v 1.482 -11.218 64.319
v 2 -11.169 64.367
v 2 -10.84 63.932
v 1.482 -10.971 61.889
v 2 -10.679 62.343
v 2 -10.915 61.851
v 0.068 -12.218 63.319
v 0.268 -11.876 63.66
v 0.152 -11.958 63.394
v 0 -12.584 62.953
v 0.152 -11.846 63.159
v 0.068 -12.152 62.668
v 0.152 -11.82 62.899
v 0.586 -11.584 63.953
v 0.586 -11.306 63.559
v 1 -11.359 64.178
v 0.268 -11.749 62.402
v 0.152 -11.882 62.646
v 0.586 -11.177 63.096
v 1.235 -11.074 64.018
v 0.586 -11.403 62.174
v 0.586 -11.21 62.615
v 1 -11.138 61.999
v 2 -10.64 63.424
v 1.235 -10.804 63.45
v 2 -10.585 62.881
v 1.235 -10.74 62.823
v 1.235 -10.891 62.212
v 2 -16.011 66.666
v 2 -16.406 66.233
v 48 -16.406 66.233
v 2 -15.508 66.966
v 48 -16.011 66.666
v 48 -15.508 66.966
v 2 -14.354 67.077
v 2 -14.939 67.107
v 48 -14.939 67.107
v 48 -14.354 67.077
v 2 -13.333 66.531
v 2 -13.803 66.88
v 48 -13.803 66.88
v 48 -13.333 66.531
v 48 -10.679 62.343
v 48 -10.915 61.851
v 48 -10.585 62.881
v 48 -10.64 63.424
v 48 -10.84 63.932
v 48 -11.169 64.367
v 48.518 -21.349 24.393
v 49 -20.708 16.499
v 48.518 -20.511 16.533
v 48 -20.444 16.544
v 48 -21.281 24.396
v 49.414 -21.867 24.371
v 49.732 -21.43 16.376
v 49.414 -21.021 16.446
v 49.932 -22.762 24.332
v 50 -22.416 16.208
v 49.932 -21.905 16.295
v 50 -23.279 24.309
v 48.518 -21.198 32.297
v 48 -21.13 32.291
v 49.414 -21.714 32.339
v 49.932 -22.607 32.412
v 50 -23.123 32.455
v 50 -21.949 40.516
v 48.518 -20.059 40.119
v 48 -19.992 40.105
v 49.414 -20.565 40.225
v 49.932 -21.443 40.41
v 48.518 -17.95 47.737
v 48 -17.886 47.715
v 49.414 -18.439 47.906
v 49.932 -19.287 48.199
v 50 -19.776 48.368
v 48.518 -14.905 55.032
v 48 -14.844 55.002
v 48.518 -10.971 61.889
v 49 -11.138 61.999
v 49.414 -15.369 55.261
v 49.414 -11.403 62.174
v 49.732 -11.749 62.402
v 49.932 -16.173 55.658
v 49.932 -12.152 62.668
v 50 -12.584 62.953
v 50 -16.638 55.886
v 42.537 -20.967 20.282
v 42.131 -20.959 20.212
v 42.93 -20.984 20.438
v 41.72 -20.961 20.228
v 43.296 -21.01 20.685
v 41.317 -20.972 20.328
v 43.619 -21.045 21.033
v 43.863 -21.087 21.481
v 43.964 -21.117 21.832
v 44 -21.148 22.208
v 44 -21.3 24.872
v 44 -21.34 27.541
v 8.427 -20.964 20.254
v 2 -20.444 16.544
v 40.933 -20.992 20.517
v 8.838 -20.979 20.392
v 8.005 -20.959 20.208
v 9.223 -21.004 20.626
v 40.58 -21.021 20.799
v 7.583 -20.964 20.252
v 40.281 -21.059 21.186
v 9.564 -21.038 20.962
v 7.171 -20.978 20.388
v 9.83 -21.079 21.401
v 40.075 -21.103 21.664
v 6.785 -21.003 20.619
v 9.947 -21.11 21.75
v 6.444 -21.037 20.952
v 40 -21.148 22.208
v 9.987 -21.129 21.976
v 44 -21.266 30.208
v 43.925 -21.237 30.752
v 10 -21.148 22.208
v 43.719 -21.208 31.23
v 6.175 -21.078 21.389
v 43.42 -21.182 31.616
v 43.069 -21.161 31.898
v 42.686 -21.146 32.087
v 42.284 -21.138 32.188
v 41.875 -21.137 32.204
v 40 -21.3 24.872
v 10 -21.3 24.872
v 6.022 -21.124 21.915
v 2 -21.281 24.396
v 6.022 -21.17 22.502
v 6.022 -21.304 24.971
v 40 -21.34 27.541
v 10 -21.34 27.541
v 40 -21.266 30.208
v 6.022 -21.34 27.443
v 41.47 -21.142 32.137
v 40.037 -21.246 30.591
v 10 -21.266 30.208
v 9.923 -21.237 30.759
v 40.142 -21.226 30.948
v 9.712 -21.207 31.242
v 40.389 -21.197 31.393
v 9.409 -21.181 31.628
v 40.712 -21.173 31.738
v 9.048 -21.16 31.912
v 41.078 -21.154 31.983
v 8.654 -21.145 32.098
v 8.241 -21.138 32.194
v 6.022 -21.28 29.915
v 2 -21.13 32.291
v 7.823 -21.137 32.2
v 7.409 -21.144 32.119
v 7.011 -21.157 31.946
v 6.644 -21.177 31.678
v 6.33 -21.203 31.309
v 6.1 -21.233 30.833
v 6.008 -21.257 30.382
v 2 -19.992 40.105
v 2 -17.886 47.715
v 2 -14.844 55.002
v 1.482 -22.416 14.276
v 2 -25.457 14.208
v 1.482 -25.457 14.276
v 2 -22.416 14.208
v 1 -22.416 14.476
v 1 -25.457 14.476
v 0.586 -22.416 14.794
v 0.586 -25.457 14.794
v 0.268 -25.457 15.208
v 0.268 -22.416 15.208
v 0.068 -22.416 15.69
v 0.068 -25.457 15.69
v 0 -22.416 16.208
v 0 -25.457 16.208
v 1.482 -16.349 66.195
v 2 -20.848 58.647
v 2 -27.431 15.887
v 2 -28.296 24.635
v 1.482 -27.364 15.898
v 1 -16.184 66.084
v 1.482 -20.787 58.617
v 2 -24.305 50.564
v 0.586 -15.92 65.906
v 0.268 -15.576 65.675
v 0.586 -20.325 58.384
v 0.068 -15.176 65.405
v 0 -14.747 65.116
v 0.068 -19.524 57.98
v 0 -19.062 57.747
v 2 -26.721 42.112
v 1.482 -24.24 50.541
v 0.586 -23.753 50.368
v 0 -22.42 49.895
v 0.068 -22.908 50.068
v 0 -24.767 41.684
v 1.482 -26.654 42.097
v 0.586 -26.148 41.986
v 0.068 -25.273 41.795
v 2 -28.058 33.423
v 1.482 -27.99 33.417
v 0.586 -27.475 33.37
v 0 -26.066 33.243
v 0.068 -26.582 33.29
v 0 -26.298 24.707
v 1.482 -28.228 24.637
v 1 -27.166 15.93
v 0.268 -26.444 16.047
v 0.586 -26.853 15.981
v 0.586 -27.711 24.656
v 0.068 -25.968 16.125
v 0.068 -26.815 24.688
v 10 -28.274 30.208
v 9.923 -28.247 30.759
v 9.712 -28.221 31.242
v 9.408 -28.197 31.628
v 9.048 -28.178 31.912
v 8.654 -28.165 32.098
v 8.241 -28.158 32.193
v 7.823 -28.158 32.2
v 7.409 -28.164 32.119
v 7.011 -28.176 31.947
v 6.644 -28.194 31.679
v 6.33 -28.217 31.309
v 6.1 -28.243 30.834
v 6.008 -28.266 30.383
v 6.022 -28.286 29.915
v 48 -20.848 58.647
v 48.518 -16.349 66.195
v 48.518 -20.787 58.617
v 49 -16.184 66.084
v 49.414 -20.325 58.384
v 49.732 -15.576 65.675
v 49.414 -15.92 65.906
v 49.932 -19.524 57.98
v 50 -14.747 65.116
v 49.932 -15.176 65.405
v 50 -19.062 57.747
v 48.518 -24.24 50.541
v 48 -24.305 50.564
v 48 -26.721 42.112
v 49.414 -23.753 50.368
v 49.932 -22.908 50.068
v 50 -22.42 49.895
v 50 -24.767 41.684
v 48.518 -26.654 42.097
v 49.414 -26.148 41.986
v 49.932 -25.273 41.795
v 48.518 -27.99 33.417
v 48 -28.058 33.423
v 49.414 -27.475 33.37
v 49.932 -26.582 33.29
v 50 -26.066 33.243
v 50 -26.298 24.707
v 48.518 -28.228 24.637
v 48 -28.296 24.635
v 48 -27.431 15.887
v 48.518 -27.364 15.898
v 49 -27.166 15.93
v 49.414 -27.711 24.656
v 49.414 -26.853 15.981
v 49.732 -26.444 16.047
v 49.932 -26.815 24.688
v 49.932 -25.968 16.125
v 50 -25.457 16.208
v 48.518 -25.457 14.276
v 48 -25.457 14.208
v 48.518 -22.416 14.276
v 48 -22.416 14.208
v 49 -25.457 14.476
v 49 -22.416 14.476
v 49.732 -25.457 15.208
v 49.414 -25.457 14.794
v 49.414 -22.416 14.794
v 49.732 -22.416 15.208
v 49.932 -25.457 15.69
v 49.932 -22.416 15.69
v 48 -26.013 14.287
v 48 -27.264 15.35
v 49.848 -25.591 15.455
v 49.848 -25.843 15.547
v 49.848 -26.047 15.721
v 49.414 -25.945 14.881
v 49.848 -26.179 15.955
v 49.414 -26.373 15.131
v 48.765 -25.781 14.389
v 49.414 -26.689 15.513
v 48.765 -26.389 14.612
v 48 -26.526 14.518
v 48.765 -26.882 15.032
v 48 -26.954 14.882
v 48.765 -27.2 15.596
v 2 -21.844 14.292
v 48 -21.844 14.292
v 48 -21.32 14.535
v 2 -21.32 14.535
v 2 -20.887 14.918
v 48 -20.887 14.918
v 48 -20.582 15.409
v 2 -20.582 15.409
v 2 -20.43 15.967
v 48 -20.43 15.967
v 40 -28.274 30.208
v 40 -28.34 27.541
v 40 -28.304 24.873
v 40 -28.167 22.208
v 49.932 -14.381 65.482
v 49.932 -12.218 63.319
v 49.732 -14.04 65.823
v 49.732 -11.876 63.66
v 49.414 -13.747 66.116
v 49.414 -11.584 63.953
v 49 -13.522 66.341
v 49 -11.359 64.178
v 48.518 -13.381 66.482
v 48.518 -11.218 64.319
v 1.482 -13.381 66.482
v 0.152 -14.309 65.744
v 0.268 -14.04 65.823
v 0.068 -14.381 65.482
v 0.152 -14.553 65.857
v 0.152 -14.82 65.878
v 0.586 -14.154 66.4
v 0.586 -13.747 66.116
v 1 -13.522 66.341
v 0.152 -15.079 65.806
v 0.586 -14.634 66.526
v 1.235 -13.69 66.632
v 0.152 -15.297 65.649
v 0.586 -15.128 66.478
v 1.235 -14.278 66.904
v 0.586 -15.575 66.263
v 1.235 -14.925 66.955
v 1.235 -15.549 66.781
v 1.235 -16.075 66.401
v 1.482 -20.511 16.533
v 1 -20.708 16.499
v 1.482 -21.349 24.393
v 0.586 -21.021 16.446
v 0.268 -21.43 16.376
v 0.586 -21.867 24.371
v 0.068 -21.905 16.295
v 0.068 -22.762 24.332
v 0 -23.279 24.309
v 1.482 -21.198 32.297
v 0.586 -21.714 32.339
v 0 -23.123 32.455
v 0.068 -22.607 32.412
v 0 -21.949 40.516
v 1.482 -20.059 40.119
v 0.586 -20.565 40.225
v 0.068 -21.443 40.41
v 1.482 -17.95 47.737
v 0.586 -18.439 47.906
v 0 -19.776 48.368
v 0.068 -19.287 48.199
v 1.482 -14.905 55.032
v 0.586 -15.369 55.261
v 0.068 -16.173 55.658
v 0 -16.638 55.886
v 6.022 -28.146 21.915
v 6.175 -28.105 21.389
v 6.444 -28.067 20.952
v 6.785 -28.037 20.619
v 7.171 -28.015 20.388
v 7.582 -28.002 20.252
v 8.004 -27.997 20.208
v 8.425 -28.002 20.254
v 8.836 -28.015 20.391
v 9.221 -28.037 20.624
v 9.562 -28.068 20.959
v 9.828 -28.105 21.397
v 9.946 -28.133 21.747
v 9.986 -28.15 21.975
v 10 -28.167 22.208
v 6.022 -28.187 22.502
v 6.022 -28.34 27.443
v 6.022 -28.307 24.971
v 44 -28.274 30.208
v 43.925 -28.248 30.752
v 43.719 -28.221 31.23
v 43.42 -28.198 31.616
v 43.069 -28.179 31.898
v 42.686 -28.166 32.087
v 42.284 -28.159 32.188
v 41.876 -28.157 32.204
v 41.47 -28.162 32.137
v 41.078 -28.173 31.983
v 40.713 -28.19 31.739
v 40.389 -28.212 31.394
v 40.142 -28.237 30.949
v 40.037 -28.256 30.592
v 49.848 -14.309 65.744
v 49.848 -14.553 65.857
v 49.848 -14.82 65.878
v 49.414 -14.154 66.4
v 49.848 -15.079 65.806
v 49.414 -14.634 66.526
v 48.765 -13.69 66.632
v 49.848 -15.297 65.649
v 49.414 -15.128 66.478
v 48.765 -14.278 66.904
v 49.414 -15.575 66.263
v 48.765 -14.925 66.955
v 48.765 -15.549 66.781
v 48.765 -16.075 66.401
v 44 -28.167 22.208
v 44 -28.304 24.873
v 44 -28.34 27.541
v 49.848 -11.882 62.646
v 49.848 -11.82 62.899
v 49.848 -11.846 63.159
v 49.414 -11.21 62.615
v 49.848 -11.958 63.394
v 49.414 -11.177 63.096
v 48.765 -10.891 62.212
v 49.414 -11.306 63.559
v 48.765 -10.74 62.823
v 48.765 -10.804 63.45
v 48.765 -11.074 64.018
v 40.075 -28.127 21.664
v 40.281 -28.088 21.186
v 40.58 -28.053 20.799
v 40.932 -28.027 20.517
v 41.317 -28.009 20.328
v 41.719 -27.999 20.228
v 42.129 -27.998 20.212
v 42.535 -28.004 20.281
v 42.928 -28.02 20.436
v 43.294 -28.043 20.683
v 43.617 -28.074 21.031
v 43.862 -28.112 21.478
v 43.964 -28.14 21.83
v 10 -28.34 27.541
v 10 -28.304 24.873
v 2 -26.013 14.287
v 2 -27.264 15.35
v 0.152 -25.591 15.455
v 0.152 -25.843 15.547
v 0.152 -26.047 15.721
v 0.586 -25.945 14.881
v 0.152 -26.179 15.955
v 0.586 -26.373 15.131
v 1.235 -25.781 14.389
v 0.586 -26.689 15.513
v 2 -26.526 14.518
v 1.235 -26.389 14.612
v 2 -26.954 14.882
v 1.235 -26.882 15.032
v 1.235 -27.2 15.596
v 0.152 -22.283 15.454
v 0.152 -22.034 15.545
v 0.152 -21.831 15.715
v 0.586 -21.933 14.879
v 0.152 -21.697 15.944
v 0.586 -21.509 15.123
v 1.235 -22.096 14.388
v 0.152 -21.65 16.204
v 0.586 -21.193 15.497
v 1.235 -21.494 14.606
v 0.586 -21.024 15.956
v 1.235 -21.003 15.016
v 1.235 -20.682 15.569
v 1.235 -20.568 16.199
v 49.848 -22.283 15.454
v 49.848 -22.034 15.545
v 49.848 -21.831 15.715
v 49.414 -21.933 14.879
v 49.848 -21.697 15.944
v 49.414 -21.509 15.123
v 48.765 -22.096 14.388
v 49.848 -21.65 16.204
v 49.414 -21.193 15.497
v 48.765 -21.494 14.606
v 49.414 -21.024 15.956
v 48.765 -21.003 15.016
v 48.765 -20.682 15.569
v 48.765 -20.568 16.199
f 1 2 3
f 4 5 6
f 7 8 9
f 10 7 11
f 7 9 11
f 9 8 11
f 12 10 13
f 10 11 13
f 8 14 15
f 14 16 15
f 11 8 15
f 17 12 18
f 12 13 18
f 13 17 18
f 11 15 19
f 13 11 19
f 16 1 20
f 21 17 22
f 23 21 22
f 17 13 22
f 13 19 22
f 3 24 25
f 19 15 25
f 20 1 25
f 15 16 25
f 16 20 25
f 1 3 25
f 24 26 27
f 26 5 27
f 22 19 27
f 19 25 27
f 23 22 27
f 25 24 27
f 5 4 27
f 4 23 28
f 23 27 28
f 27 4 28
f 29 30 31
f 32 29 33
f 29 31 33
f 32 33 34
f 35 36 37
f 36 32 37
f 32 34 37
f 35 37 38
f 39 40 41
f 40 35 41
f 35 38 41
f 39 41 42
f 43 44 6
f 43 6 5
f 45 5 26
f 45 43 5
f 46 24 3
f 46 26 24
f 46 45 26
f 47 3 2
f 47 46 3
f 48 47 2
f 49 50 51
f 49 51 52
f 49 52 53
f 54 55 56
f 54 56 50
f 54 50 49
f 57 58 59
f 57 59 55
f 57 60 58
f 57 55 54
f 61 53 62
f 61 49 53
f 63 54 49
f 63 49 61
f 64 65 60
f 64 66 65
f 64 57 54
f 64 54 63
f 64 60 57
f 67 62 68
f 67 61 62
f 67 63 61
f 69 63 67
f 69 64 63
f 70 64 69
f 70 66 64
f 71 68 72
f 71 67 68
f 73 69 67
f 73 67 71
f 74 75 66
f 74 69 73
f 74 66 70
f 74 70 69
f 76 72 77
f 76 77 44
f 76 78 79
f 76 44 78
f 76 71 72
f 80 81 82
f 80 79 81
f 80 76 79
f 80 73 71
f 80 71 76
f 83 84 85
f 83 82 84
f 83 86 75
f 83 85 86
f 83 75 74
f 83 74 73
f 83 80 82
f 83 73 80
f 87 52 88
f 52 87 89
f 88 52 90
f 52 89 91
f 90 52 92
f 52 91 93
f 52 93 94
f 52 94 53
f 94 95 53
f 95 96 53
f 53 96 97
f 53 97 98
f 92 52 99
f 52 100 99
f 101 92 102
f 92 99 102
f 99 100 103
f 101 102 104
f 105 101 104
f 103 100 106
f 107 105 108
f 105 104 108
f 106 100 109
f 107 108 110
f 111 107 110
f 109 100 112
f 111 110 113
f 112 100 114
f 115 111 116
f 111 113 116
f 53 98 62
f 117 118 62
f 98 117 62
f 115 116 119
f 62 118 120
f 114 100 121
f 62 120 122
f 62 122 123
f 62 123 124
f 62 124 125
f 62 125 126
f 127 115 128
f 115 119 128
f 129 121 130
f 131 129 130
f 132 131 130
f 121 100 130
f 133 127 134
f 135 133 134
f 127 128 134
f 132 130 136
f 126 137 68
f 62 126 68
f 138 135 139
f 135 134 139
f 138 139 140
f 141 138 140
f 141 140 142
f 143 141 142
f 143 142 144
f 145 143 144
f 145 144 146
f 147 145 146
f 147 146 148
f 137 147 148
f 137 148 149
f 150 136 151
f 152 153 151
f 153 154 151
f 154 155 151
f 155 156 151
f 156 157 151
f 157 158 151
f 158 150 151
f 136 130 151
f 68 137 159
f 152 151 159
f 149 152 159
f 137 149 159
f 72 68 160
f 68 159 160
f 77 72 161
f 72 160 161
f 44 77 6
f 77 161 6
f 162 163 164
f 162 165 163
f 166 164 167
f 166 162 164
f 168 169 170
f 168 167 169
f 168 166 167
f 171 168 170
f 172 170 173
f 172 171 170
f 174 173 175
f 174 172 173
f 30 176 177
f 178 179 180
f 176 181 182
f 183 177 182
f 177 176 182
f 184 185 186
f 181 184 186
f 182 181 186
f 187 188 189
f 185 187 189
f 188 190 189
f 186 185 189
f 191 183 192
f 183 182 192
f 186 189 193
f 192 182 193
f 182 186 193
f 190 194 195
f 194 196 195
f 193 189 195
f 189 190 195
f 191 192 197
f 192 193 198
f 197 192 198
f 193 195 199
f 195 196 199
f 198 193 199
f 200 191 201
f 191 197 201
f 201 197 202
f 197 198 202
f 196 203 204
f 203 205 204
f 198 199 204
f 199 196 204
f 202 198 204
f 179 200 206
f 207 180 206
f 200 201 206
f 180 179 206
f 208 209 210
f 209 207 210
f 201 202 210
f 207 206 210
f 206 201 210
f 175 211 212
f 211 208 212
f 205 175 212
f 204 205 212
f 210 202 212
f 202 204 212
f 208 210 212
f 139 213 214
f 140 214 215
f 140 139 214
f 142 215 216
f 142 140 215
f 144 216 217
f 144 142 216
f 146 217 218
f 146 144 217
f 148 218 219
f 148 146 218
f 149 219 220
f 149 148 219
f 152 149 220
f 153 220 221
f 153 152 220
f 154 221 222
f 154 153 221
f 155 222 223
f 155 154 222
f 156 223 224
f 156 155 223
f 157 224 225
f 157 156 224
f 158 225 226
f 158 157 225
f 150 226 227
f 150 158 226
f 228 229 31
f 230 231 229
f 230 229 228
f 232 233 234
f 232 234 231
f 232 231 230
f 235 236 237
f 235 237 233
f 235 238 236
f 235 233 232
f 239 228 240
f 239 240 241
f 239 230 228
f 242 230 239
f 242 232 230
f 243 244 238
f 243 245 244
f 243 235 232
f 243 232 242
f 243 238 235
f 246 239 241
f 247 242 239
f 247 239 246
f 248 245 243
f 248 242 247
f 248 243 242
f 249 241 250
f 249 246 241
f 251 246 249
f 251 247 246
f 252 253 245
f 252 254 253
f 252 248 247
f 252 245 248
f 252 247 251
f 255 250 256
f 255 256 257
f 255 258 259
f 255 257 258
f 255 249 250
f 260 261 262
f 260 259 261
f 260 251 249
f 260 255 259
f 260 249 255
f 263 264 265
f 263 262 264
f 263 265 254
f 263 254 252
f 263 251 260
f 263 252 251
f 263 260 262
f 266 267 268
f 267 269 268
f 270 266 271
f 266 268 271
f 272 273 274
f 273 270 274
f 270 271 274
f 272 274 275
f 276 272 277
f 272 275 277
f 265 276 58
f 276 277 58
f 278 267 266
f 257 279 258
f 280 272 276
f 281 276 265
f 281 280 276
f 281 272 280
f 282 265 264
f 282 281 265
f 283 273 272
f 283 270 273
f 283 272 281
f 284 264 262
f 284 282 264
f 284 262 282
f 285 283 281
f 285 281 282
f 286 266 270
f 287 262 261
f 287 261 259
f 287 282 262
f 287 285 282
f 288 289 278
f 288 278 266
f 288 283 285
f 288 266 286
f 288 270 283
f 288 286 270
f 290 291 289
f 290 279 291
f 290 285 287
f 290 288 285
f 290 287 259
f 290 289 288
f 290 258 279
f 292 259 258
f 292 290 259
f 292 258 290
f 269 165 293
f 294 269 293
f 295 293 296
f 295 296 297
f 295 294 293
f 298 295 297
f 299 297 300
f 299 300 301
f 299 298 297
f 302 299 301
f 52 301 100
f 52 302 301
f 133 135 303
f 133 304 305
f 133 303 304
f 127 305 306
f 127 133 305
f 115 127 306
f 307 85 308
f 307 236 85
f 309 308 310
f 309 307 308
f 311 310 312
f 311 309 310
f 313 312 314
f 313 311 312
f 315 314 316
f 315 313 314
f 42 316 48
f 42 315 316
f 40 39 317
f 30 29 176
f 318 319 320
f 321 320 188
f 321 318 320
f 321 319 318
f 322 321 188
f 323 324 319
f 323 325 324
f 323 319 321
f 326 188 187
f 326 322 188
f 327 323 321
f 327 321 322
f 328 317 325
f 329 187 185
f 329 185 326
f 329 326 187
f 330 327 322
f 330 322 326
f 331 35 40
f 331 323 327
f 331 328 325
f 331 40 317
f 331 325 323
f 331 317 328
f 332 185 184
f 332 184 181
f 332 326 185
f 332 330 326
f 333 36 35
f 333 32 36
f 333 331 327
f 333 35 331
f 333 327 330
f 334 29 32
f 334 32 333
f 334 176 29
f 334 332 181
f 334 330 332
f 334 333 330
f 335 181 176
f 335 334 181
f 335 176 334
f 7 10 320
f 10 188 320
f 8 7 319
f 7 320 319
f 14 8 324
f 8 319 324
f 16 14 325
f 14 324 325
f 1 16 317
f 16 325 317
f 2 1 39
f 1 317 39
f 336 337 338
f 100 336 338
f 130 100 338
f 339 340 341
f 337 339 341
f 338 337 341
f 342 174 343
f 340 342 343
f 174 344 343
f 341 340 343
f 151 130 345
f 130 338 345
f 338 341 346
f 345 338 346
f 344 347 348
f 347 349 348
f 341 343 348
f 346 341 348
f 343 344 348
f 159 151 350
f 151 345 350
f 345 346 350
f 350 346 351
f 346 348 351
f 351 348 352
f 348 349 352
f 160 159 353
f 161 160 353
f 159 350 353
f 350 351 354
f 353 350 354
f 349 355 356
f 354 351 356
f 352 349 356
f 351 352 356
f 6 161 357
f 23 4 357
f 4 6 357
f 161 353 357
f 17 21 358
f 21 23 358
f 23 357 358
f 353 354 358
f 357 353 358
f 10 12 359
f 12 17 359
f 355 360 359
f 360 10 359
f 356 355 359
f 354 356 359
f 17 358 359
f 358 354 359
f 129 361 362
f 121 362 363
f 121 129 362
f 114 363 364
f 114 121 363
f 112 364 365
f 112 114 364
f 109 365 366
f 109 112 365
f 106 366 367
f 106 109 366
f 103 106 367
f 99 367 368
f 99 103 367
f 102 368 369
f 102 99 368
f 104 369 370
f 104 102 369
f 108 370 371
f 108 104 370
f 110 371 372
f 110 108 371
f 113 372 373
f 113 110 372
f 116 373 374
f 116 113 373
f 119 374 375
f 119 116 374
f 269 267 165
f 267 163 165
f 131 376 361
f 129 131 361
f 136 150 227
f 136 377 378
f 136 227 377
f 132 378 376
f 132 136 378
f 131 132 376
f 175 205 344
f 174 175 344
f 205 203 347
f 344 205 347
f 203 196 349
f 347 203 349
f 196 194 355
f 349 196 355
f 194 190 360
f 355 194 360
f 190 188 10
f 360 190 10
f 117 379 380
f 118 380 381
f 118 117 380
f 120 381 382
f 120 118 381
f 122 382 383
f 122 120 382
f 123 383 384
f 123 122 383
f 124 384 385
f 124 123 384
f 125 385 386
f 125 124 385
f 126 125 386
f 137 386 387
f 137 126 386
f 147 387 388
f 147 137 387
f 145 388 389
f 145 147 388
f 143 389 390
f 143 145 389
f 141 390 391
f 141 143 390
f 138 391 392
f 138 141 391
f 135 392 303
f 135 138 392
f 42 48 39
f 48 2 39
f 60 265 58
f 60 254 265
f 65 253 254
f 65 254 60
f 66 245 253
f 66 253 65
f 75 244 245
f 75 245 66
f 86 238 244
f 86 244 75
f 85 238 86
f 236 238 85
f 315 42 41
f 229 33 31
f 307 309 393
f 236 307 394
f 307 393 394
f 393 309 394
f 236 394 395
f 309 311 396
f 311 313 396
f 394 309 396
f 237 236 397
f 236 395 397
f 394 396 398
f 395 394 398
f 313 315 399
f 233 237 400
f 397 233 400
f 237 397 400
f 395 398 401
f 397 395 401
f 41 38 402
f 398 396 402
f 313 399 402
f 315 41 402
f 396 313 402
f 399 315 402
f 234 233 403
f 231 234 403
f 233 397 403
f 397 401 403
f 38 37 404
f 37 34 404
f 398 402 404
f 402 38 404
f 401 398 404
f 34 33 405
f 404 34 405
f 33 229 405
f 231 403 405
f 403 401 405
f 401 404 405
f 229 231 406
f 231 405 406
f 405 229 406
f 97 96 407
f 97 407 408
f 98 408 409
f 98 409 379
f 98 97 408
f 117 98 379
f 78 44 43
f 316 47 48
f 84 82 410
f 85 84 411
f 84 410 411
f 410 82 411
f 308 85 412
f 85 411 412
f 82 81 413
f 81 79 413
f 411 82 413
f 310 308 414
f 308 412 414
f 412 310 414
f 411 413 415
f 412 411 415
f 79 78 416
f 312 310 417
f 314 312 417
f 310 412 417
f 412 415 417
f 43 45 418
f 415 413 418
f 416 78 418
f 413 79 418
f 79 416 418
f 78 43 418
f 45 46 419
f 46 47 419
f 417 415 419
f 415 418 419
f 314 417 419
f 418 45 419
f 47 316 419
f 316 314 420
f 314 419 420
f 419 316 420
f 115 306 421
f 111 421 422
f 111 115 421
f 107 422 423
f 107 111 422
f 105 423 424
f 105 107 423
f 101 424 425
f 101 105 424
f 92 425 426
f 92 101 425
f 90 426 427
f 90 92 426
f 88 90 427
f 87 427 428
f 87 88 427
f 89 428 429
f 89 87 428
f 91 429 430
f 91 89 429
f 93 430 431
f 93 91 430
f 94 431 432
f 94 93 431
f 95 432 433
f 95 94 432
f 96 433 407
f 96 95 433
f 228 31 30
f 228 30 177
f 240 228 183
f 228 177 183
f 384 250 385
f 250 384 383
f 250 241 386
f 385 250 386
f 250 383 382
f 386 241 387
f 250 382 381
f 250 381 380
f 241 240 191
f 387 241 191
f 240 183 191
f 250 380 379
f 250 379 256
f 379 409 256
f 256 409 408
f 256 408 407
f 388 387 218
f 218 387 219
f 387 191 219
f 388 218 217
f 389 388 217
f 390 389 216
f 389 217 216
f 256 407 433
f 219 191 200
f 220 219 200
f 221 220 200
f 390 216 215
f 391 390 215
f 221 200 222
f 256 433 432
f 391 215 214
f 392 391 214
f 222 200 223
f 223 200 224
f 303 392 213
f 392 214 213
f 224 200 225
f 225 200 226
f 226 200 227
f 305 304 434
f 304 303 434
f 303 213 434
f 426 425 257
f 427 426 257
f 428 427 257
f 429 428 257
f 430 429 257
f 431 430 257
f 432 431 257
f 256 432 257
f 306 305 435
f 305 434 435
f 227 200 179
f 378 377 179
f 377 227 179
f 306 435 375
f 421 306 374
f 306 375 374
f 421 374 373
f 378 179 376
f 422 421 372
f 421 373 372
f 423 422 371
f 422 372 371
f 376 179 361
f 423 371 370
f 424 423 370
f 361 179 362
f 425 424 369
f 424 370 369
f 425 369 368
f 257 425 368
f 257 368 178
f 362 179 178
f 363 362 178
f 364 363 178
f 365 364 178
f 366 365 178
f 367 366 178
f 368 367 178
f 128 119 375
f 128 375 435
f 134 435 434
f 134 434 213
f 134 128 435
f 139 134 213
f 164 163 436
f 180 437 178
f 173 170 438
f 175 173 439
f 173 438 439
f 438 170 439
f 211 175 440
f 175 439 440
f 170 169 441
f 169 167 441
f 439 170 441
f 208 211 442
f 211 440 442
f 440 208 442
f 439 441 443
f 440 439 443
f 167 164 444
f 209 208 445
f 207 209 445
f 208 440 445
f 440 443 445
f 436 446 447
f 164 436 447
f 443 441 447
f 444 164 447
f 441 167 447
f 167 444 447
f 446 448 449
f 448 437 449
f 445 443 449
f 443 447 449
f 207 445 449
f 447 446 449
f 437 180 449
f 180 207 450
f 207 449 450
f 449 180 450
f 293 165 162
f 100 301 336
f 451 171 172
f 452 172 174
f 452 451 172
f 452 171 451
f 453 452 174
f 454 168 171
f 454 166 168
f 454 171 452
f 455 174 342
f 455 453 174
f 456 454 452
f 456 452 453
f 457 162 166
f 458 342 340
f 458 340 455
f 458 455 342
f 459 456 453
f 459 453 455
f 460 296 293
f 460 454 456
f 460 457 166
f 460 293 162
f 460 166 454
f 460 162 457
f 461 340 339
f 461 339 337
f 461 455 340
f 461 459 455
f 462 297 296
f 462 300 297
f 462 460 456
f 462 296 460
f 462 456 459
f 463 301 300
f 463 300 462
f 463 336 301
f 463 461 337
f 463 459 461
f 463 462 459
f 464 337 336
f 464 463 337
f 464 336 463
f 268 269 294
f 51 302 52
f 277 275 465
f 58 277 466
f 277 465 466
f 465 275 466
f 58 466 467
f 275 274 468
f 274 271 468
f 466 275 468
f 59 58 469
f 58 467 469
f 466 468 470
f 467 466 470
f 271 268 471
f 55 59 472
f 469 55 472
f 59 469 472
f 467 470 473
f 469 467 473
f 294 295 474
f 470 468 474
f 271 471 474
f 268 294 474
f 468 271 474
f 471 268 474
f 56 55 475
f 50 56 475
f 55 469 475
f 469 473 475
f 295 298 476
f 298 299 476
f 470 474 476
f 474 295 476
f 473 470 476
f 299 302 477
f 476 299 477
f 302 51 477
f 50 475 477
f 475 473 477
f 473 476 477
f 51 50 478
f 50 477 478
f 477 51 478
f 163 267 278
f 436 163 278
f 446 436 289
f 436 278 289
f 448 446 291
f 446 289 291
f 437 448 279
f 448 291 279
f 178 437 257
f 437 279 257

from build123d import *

# Parameters (mm, degrees)
F1_DEPTH = 50
F3_DEPTH = 50
F4_R     = 2


with BuildPart() as f1:
    # F0 (on Right) → F1 (new body)
    with BuildSketch(Plane.YZ):
        with BuildLine():
            Line((-27.136585, 14.208124), (-20, 14.208124))
            ThreePointArc((-20, 14.208124), (-20.068162, 39.737556), (-10, 63.197919))
            Line((-10, 63.197919), (-15.019473, 68.217392))
            ThreePointArc((-15.019473, 68.217392), (-26.643162, 42.461309), (-27.136585, 14.208124))
        make_face()
    extrude(amount=F1_DEPTH)

    # F2 (on Front) → F3 (cut)
    with BuildSketch(Plane.XZ):
        with BuildLine():
            Line((6.021636, 22.501509), (6.021636, 21.914739))
            ThreePointArc((6.021636, 21.914739), (8.147091, 20.21354), (10, 22.208124))
            ThreePointArc((10, 22.208124), (8.147091, 24.202708), (6.021636, 22.501509))
        make_face()
        with BuildLine():
            ThreePointArc((6.021636, 22.501509), (6, 22.208124), (6.021636, 21.914739))
            Line((6.021636, 21.914739), (6.021636, 22.501509))
        make_face()
        with BuildLine():
            ThreePointArc((6.021636, 22.501509), (8.147091, 24.202708), (10, 22.208124))
            Line((10, 22.208124), (10, 30.208124))
            ThreePointArc((10, 30.208124), (8.147091, 28.21354), (6.021636, 29.914739))
            Line((6.021636, 29.914739), (6.021636, 22.501509))
        make_face()
        with BuildLine():
            ThreePointArc((6.021636, 29.914739), (8.147091, 28.21354), (10, 30.208124))
            ThreePointArc((10, 30.208124), (7.852909, 32.202708), (6.021636, 29.914739))
        make_face()
        with BuildLine():
            ThreePointArc((40, 22.208124), (42, 20.208124), (44, 22.208124))
            ThreePointArc((44, 22.208124), (42, 24.208124), (40, 22.208124))
        make_face()
        with BuildLine():
            ThreePointArc((40, 22.208124), (42, 24.208124), (44, 22.208124))
            Line((44, 22.208124), (44, 30.208124))
            ThreePointArc((44, 30.208124), (42, 28.208124), (40, 30.208124))
            Line((40, 30.208124), (40, 22.208124))
        make_face()
        with BuildLine():
            ThreePointArc((40, 30.208124), (42, 28.208124), (44, 30.208124))
            ThreePointArc((44, 30.208124), (42, 32.208124), (40, 30.208124))
        make_face()
    extrude(amount=F3_DEPTH, mode=Mode.SUBTRACT)

    # F4
    f4_edges = [f1.edges().sort_by_distance(p)[0] for p in [
        (50, -23.568293, 14.208124),
        (50, -20.068162, 39.737556),
        (50, -12.509737, 65.707655),
        (50, -26.643162, 42.461309),
        (25, -10, 63.197919),
        (25, -15.019473, 68.217392),
        (0, -12.509737, 65.707655),
        (0, -23.568293, 14.208124),
        (0, -20.068162, 39.737556),
        (0, -26.643162, 42.461309),
        (25, -27.136585, 14.208124),
        (25, -20, 14.208124),
    ]]
    fillet(f4_edges, radius=F4_R)


solid = f1.part
